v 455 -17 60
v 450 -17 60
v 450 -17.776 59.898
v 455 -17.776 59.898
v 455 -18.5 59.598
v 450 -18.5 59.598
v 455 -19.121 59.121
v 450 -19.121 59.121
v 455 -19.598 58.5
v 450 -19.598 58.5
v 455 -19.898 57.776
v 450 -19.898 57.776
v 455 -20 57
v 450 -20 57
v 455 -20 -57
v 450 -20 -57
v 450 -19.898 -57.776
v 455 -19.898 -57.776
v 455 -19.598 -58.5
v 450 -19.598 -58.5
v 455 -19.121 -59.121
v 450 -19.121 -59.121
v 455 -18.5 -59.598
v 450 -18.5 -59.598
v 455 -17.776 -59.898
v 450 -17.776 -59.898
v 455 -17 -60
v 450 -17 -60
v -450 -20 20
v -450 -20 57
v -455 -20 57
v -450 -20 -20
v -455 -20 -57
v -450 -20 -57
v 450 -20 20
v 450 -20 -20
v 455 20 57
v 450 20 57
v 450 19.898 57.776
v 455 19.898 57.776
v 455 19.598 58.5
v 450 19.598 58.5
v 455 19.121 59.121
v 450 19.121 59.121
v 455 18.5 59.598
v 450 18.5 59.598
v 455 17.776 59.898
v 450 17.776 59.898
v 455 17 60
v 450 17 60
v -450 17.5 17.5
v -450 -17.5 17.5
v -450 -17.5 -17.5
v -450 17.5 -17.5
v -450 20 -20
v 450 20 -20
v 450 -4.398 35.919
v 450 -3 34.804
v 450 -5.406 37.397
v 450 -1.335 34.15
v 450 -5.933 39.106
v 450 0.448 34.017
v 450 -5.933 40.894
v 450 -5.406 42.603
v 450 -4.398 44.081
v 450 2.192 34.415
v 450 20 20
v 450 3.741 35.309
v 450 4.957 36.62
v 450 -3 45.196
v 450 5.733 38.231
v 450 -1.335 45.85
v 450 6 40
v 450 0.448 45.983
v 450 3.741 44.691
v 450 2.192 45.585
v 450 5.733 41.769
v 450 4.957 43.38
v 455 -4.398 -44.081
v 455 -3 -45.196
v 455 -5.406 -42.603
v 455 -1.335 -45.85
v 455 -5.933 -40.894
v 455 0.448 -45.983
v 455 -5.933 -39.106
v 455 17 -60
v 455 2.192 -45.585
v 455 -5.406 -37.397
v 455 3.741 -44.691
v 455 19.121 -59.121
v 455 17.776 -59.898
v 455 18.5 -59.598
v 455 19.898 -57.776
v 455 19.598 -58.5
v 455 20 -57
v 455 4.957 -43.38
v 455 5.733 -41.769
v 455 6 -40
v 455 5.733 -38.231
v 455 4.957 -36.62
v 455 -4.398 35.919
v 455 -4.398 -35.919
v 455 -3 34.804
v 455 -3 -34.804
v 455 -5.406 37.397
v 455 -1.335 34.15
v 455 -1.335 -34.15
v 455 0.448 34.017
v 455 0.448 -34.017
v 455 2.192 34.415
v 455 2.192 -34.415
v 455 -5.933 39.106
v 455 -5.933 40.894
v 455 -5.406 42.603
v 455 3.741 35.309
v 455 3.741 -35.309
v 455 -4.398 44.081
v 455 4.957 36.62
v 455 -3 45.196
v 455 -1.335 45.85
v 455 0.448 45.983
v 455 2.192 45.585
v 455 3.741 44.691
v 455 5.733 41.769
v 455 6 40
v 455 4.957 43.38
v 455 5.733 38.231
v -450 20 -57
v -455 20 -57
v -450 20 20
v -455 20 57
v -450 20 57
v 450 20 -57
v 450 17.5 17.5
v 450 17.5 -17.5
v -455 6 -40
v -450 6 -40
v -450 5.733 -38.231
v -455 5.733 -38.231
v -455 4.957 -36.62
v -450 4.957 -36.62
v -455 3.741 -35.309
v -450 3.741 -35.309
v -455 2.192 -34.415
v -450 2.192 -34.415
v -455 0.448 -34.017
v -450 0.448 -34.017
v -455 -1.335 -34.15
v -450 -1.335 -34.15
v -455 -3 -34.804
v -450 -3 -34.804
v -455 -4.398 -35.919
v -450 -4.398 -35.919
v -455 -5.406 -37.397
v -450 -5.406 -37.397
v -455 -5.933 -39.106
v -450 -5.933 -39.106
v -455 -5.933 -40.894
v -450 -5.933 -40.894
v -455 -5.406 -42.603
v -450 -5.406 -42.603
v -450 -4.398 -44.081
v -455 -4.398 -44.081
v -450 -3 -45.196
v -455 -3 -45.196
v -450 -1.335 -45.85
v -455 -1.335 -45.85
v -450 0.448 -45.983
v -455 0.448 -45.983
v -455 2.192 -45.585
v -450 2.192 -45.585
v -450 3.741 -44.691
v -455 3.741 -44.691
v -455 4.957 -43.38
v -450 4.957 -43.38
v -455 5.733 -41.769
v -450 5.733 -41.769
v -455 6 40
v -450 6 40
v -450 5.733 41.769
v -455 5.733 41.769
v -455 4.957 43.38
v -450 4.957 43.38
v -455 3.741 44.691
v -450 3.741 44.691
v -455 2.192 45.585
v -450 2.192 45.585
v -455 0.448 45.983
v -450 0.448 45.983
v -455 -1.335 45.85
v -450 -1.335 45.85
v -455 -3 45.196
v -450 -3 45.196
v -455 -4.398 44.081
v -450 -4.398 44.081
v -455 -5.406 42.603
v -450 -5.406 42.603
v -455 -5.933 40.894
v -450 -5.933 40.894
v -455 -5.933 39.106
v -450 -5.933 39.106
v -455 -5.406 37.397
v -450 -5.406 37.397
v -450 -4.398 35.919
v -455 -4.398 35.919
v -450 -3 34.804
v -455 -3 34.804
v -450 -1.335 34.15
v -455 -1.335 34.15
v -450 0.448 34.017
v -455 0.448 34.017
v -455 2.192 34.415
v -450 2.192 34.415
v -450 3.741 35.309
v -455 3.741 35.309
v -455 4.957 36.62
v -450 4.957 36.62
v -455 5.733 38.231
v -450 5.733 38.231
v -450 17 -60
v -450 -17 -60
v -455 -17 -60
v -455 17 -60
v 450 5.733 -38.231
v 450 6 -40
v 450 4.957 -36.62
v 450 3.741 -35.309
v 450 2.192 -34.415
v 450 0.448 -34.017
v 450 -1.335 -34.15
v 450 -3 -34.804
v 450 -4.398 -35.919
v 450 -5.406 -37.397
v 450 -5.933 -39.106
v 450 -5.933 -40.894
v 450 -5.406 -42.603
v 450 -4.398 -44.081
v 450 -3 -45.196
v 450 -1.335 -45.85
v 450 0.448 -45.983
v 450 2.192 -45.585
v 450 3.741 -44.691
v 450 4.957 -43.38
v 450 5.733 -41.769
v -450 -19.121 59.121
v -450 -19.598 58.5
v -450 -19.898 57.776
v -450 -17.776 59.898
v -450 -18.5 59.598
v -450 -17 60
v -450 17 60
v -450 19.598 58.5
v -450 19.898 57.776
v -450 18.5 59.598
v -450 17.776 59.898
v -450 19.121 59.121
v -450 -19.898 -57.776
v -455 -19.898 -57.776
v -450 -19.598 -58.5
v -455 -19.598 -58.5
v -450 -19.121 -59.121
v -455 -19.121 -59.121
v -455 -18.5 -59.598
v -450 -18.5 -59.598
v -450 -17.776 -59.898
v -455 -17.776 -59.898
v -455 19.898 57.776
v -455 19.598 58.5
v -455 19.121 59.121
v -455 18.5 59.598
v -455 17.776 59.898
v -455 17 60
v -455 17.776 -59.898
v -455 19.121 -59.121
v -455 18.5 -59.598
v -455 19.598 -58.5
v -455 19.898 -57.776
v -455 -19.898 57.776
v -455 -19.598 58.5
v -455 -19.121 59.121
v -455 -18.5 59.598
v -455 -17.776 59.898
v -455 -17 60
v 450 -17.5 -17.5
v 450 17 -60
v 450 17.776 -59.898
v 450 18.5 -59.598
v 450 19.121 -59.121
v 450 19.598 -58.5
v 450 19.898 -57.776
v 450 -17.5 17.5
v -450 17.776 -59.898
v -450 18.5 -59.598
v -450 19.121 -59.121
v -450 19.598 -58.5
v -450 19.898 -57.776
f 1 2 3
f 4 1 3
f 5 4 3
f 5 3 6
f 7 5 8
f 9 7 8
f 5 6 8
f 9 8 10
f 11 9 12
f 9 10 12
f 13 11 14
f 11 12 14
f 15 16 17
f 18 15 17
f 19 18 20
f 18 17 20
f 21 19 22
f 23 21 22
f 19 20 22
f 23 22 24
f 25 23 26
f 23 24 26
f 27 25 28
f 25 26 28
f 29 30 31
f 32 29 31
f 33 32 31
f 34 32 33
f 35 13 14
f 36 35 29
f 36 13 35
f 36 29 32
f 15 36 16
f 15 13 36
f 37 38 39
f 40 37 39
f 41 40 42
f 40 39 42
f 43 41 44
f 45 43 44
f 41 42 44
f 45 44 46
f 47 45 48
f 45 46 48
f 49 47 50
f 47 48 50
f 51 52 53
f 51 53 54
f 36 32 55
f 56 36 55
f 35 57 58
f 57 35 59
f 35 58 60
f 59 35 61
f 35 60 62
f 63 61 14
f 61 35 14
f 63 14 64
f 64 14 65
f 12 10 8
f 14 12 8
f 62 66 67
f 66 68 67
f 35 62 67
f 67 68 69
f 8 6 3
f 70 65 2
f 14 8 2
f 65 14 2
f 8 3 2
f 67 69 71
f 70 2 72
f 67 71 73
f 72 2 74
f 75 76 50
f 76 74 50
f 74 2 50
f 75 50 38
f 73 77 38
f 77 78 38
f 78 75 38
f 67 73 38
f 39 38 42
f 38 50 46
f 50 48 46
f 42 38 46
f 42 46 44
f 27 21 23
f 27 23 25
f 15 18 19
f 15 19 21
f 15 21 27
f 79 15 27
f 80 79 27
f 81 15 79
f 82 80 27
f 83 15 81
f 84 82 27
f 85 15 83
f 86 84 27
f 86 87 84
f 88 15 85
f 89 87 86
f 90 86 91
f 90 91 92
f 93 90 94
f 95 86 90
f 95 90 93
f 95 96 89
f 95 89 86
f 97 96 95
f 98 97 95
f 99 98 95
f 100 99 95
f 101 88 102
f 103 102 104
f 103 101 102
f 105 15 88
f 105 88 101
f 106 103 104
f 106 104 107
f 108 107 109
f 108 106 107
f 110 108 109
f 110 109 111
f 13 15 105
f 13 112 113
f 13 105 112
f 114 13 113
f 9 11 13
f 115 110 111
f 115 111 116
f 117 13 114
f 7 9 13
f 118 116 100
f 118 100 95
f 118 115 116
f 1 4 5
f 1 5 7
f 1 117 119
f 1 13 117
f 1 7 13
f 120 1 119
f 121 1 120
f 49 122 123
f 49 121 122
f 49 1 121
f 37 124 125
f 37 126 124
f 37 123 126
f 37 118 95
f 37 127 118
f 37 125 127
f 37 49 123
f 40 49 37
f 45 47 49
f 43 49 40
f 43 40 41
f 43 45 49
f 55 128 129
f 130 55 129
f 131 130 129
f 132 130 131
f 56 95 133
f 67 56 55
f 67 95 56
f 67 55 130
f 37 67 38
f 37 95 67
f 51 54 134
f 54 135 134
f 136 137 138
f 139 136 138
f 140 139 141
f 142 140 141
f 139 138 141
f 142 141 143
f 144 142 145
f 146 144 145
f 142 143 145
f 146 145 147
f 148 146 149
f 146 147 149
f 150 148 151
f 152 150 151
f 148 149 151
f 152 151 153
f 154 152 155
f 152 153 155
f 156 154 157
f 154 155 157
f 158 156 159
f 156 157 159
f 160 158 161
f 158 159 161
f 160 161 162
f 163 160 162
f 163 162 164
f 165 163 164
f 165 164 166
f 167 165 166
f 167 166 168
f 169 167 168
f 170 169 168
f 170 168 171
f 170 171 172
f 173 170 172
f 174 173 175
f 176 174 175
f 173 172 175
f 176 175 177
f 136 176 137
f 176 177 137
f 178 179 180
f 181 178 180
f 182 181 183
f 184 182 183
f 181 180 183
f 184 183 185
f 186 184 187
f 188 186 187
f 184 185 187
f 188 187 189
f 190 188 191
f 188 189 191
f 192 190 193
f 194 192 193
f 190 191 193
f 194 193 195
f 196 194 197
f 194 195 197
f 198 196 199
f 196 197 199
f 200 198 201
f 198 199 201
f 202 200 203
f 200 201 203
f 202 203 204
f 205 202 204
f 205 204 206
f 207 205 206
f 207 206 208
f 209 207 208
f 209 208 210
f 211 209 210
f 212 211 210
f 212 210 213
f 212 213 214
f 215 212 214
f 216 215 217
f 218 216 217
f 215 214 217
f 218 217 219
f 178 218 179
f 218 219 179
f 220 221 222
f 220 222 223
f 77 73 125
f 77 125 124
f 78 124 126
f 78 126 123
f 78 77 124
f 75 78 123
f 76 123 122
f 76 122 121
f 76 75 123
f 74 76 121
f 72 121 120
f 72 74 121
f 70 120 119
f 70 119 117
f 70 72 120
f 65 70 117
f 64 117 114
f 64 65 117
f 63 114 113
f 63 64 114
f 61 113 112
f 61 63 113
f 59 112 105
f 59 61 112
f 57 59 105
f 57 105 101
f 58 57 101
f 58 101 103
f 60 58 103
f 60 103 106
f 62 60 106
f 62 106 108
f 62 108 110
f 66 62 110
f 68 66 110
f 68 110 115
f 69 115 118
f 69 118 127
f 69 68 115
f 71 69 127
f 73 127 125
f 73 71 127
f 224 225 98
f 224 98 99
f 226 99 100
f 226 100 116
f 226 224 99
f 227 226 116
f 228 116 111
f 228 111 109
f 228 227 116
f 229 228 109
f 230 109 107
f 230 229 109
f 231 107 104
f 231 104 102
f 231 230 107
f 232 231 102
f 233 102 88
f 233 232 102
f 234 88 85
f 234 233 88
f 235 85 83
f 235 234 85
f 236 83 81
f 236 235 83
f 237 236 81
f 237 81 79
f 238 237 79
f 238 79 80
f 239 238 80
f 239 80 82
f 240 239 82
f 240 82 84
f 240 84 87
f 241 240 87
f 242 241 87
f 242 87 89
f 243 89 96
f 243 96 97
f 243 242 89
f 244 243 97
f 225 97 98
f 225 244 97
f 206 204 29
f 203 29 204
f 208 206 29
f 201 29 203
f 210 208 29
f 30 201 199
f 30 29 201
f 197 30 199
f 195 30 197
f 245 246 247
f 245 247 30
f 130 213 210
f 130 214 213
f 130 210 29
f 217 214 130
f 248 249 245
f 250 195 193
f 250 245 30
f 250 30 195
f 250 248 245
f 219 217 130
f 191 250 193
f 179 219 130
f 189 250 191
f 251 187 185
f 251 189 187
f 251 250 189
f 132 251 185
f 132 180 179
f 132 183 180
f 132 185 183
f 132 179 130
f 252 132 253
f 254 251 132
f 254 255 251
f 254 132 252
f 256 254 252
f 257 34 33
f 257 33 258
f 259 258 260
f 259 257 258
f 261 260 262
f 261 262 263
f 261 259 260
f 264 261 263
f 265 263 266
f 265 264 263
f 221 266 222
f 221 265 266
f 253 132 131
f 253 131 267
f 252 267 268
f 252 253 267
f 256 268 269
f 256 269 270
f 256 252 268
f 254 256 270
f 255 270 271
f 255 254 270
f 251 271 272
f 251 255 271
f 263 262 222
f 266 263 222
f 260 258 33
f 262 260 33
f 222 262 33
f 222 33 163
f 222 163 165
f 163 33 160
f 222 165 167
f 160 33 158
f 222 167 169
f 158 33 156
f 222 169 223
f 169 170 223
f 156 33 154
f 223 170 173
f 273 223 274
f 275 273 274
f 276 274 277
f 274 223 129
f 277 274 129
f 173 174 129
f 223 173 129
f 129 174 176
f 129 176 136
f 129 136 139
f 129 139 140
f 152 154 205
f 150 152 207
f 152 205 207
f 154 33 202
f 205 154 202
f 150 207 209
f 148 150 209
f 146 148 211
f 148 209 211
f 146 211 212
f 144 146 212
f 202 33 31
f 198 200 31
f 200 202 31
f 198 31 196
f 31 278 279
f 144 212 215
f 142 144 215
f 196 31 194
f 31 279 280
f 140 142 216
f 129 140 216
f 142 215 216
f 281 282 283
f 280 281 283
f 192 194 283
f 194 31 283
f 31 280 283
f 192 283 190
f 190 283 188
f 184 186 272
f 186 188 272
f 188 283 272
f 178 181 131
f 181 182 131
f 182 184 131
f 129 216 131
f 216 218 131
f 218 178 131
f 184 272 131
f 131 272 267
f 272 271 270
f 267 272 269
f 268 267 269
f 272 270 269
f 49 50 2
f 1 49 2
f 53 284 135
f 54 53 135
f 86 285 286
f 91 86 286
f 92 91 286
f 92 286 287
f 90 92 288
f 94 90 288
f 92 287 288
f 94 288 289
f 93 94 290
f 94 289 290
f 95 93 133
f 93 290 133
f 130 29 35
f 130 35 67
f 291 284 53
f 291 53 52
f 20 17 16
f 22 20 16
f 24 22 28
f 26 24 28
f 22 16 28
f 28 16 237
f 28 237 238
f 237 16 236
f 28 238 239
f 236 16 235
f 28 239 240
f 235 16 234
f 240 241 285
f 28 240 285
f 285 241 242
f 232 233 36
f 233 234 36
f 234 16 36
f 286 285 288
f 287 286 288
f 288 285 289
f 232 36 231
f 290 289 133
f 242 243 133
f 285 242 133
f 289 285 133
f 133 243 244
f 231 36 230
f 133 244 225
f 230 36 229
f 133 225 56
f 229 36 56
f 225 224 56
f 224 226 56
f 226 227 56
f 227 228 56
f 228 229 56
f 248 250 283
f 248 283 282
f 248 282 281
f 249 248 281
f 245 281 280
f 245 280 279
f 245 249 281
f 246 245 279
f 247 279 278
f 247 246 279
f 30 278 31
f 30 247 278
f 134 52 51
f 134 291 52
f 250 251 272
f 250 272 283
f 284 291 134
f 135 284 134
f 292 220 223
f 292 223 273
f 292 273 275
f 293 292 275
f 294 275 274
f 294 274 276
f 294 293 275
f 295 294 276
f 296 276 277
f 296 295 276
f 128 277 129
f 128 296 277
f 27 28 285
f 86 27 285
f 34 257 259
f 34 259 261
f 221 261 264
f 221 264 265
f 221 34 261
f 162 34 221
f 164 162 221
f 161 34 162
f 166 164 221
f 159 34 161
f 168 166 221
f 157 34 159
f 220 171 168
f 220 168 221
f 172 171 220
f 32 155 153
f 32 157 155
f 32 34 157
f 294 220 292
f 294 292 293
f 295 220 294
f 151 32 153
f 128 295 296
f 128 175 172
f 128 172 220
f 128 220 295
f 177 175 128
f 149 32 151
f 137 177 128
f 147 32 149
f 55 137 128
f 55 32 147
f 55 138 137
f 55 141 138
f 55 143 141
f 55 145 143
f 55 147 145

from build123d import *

# Parameters (mm, degrees)
F0_W     = 40
F0_H     = 40
F0_W_2   = 35
F0_H_2   = 35
F1_DEPTH = 450
F2_R     = 6
F3_DEPTH = 5


with BuildPart() as f1:
    # F0 (on Right) → F1 (new body, symmetric)
    with BuildSketch(Plane.YZ):
        Rectangle(F0_W, F0_H)
        Rectangle(F0_W_2, F0_H_2, mode=Mode.SUBTRACT)
    extrude(amount=F1_DEPTH, both=True)

    # F2 (on face) → F3 (join)
    with BuildSketch(Plane.YZ.offset(450)):
        with BuildLine():
            Line((20, -20), (20, 20))
            Line((20, 20), (-20, 20))
            Line((-20, 20), (-20, -20))
            Line((-20, -20), (-20, -57))
            ThreePointArc((-20, -57), (-19.1213203436, -59.1213203436), (-17, -60))
            Line((-17, -60), (17, -60))
            ThreePointArc((17, -60), (19.1213203436, -59.1213203436), (20, -57))
            Line((20, -57), (20, -20))
        make_face()
        with Locations((0, -40)):
            Circle(F2_R, mode=Mode.SUBTRACT)
        with BuildLine():
            Line((-20, 20), (20, 20))
            Line((20, 20), (20, 57))
            ThreePointArc((20, 57), (19.1213203436, 59.1213203436), (17, 60))
            Line((17, 60), (-17, 60))
            ThreePointArc((-17, 60), (-19.1213203436, 59.1213203436), (-20, 57))
            Line((-20, 57), (-20, 20))
        make_face()
        with Locations((0, 40)):
            Circle(F2_R, mode=Mode.SUBTRACT)
    extrude(amount=F3_DEPTH)

    # F4: F1 across plane


with BuildPart() as f1_1:
    add(f1.part)
    add(f1.part.mirror(Plane.YZ))


solid = f1_1.part
